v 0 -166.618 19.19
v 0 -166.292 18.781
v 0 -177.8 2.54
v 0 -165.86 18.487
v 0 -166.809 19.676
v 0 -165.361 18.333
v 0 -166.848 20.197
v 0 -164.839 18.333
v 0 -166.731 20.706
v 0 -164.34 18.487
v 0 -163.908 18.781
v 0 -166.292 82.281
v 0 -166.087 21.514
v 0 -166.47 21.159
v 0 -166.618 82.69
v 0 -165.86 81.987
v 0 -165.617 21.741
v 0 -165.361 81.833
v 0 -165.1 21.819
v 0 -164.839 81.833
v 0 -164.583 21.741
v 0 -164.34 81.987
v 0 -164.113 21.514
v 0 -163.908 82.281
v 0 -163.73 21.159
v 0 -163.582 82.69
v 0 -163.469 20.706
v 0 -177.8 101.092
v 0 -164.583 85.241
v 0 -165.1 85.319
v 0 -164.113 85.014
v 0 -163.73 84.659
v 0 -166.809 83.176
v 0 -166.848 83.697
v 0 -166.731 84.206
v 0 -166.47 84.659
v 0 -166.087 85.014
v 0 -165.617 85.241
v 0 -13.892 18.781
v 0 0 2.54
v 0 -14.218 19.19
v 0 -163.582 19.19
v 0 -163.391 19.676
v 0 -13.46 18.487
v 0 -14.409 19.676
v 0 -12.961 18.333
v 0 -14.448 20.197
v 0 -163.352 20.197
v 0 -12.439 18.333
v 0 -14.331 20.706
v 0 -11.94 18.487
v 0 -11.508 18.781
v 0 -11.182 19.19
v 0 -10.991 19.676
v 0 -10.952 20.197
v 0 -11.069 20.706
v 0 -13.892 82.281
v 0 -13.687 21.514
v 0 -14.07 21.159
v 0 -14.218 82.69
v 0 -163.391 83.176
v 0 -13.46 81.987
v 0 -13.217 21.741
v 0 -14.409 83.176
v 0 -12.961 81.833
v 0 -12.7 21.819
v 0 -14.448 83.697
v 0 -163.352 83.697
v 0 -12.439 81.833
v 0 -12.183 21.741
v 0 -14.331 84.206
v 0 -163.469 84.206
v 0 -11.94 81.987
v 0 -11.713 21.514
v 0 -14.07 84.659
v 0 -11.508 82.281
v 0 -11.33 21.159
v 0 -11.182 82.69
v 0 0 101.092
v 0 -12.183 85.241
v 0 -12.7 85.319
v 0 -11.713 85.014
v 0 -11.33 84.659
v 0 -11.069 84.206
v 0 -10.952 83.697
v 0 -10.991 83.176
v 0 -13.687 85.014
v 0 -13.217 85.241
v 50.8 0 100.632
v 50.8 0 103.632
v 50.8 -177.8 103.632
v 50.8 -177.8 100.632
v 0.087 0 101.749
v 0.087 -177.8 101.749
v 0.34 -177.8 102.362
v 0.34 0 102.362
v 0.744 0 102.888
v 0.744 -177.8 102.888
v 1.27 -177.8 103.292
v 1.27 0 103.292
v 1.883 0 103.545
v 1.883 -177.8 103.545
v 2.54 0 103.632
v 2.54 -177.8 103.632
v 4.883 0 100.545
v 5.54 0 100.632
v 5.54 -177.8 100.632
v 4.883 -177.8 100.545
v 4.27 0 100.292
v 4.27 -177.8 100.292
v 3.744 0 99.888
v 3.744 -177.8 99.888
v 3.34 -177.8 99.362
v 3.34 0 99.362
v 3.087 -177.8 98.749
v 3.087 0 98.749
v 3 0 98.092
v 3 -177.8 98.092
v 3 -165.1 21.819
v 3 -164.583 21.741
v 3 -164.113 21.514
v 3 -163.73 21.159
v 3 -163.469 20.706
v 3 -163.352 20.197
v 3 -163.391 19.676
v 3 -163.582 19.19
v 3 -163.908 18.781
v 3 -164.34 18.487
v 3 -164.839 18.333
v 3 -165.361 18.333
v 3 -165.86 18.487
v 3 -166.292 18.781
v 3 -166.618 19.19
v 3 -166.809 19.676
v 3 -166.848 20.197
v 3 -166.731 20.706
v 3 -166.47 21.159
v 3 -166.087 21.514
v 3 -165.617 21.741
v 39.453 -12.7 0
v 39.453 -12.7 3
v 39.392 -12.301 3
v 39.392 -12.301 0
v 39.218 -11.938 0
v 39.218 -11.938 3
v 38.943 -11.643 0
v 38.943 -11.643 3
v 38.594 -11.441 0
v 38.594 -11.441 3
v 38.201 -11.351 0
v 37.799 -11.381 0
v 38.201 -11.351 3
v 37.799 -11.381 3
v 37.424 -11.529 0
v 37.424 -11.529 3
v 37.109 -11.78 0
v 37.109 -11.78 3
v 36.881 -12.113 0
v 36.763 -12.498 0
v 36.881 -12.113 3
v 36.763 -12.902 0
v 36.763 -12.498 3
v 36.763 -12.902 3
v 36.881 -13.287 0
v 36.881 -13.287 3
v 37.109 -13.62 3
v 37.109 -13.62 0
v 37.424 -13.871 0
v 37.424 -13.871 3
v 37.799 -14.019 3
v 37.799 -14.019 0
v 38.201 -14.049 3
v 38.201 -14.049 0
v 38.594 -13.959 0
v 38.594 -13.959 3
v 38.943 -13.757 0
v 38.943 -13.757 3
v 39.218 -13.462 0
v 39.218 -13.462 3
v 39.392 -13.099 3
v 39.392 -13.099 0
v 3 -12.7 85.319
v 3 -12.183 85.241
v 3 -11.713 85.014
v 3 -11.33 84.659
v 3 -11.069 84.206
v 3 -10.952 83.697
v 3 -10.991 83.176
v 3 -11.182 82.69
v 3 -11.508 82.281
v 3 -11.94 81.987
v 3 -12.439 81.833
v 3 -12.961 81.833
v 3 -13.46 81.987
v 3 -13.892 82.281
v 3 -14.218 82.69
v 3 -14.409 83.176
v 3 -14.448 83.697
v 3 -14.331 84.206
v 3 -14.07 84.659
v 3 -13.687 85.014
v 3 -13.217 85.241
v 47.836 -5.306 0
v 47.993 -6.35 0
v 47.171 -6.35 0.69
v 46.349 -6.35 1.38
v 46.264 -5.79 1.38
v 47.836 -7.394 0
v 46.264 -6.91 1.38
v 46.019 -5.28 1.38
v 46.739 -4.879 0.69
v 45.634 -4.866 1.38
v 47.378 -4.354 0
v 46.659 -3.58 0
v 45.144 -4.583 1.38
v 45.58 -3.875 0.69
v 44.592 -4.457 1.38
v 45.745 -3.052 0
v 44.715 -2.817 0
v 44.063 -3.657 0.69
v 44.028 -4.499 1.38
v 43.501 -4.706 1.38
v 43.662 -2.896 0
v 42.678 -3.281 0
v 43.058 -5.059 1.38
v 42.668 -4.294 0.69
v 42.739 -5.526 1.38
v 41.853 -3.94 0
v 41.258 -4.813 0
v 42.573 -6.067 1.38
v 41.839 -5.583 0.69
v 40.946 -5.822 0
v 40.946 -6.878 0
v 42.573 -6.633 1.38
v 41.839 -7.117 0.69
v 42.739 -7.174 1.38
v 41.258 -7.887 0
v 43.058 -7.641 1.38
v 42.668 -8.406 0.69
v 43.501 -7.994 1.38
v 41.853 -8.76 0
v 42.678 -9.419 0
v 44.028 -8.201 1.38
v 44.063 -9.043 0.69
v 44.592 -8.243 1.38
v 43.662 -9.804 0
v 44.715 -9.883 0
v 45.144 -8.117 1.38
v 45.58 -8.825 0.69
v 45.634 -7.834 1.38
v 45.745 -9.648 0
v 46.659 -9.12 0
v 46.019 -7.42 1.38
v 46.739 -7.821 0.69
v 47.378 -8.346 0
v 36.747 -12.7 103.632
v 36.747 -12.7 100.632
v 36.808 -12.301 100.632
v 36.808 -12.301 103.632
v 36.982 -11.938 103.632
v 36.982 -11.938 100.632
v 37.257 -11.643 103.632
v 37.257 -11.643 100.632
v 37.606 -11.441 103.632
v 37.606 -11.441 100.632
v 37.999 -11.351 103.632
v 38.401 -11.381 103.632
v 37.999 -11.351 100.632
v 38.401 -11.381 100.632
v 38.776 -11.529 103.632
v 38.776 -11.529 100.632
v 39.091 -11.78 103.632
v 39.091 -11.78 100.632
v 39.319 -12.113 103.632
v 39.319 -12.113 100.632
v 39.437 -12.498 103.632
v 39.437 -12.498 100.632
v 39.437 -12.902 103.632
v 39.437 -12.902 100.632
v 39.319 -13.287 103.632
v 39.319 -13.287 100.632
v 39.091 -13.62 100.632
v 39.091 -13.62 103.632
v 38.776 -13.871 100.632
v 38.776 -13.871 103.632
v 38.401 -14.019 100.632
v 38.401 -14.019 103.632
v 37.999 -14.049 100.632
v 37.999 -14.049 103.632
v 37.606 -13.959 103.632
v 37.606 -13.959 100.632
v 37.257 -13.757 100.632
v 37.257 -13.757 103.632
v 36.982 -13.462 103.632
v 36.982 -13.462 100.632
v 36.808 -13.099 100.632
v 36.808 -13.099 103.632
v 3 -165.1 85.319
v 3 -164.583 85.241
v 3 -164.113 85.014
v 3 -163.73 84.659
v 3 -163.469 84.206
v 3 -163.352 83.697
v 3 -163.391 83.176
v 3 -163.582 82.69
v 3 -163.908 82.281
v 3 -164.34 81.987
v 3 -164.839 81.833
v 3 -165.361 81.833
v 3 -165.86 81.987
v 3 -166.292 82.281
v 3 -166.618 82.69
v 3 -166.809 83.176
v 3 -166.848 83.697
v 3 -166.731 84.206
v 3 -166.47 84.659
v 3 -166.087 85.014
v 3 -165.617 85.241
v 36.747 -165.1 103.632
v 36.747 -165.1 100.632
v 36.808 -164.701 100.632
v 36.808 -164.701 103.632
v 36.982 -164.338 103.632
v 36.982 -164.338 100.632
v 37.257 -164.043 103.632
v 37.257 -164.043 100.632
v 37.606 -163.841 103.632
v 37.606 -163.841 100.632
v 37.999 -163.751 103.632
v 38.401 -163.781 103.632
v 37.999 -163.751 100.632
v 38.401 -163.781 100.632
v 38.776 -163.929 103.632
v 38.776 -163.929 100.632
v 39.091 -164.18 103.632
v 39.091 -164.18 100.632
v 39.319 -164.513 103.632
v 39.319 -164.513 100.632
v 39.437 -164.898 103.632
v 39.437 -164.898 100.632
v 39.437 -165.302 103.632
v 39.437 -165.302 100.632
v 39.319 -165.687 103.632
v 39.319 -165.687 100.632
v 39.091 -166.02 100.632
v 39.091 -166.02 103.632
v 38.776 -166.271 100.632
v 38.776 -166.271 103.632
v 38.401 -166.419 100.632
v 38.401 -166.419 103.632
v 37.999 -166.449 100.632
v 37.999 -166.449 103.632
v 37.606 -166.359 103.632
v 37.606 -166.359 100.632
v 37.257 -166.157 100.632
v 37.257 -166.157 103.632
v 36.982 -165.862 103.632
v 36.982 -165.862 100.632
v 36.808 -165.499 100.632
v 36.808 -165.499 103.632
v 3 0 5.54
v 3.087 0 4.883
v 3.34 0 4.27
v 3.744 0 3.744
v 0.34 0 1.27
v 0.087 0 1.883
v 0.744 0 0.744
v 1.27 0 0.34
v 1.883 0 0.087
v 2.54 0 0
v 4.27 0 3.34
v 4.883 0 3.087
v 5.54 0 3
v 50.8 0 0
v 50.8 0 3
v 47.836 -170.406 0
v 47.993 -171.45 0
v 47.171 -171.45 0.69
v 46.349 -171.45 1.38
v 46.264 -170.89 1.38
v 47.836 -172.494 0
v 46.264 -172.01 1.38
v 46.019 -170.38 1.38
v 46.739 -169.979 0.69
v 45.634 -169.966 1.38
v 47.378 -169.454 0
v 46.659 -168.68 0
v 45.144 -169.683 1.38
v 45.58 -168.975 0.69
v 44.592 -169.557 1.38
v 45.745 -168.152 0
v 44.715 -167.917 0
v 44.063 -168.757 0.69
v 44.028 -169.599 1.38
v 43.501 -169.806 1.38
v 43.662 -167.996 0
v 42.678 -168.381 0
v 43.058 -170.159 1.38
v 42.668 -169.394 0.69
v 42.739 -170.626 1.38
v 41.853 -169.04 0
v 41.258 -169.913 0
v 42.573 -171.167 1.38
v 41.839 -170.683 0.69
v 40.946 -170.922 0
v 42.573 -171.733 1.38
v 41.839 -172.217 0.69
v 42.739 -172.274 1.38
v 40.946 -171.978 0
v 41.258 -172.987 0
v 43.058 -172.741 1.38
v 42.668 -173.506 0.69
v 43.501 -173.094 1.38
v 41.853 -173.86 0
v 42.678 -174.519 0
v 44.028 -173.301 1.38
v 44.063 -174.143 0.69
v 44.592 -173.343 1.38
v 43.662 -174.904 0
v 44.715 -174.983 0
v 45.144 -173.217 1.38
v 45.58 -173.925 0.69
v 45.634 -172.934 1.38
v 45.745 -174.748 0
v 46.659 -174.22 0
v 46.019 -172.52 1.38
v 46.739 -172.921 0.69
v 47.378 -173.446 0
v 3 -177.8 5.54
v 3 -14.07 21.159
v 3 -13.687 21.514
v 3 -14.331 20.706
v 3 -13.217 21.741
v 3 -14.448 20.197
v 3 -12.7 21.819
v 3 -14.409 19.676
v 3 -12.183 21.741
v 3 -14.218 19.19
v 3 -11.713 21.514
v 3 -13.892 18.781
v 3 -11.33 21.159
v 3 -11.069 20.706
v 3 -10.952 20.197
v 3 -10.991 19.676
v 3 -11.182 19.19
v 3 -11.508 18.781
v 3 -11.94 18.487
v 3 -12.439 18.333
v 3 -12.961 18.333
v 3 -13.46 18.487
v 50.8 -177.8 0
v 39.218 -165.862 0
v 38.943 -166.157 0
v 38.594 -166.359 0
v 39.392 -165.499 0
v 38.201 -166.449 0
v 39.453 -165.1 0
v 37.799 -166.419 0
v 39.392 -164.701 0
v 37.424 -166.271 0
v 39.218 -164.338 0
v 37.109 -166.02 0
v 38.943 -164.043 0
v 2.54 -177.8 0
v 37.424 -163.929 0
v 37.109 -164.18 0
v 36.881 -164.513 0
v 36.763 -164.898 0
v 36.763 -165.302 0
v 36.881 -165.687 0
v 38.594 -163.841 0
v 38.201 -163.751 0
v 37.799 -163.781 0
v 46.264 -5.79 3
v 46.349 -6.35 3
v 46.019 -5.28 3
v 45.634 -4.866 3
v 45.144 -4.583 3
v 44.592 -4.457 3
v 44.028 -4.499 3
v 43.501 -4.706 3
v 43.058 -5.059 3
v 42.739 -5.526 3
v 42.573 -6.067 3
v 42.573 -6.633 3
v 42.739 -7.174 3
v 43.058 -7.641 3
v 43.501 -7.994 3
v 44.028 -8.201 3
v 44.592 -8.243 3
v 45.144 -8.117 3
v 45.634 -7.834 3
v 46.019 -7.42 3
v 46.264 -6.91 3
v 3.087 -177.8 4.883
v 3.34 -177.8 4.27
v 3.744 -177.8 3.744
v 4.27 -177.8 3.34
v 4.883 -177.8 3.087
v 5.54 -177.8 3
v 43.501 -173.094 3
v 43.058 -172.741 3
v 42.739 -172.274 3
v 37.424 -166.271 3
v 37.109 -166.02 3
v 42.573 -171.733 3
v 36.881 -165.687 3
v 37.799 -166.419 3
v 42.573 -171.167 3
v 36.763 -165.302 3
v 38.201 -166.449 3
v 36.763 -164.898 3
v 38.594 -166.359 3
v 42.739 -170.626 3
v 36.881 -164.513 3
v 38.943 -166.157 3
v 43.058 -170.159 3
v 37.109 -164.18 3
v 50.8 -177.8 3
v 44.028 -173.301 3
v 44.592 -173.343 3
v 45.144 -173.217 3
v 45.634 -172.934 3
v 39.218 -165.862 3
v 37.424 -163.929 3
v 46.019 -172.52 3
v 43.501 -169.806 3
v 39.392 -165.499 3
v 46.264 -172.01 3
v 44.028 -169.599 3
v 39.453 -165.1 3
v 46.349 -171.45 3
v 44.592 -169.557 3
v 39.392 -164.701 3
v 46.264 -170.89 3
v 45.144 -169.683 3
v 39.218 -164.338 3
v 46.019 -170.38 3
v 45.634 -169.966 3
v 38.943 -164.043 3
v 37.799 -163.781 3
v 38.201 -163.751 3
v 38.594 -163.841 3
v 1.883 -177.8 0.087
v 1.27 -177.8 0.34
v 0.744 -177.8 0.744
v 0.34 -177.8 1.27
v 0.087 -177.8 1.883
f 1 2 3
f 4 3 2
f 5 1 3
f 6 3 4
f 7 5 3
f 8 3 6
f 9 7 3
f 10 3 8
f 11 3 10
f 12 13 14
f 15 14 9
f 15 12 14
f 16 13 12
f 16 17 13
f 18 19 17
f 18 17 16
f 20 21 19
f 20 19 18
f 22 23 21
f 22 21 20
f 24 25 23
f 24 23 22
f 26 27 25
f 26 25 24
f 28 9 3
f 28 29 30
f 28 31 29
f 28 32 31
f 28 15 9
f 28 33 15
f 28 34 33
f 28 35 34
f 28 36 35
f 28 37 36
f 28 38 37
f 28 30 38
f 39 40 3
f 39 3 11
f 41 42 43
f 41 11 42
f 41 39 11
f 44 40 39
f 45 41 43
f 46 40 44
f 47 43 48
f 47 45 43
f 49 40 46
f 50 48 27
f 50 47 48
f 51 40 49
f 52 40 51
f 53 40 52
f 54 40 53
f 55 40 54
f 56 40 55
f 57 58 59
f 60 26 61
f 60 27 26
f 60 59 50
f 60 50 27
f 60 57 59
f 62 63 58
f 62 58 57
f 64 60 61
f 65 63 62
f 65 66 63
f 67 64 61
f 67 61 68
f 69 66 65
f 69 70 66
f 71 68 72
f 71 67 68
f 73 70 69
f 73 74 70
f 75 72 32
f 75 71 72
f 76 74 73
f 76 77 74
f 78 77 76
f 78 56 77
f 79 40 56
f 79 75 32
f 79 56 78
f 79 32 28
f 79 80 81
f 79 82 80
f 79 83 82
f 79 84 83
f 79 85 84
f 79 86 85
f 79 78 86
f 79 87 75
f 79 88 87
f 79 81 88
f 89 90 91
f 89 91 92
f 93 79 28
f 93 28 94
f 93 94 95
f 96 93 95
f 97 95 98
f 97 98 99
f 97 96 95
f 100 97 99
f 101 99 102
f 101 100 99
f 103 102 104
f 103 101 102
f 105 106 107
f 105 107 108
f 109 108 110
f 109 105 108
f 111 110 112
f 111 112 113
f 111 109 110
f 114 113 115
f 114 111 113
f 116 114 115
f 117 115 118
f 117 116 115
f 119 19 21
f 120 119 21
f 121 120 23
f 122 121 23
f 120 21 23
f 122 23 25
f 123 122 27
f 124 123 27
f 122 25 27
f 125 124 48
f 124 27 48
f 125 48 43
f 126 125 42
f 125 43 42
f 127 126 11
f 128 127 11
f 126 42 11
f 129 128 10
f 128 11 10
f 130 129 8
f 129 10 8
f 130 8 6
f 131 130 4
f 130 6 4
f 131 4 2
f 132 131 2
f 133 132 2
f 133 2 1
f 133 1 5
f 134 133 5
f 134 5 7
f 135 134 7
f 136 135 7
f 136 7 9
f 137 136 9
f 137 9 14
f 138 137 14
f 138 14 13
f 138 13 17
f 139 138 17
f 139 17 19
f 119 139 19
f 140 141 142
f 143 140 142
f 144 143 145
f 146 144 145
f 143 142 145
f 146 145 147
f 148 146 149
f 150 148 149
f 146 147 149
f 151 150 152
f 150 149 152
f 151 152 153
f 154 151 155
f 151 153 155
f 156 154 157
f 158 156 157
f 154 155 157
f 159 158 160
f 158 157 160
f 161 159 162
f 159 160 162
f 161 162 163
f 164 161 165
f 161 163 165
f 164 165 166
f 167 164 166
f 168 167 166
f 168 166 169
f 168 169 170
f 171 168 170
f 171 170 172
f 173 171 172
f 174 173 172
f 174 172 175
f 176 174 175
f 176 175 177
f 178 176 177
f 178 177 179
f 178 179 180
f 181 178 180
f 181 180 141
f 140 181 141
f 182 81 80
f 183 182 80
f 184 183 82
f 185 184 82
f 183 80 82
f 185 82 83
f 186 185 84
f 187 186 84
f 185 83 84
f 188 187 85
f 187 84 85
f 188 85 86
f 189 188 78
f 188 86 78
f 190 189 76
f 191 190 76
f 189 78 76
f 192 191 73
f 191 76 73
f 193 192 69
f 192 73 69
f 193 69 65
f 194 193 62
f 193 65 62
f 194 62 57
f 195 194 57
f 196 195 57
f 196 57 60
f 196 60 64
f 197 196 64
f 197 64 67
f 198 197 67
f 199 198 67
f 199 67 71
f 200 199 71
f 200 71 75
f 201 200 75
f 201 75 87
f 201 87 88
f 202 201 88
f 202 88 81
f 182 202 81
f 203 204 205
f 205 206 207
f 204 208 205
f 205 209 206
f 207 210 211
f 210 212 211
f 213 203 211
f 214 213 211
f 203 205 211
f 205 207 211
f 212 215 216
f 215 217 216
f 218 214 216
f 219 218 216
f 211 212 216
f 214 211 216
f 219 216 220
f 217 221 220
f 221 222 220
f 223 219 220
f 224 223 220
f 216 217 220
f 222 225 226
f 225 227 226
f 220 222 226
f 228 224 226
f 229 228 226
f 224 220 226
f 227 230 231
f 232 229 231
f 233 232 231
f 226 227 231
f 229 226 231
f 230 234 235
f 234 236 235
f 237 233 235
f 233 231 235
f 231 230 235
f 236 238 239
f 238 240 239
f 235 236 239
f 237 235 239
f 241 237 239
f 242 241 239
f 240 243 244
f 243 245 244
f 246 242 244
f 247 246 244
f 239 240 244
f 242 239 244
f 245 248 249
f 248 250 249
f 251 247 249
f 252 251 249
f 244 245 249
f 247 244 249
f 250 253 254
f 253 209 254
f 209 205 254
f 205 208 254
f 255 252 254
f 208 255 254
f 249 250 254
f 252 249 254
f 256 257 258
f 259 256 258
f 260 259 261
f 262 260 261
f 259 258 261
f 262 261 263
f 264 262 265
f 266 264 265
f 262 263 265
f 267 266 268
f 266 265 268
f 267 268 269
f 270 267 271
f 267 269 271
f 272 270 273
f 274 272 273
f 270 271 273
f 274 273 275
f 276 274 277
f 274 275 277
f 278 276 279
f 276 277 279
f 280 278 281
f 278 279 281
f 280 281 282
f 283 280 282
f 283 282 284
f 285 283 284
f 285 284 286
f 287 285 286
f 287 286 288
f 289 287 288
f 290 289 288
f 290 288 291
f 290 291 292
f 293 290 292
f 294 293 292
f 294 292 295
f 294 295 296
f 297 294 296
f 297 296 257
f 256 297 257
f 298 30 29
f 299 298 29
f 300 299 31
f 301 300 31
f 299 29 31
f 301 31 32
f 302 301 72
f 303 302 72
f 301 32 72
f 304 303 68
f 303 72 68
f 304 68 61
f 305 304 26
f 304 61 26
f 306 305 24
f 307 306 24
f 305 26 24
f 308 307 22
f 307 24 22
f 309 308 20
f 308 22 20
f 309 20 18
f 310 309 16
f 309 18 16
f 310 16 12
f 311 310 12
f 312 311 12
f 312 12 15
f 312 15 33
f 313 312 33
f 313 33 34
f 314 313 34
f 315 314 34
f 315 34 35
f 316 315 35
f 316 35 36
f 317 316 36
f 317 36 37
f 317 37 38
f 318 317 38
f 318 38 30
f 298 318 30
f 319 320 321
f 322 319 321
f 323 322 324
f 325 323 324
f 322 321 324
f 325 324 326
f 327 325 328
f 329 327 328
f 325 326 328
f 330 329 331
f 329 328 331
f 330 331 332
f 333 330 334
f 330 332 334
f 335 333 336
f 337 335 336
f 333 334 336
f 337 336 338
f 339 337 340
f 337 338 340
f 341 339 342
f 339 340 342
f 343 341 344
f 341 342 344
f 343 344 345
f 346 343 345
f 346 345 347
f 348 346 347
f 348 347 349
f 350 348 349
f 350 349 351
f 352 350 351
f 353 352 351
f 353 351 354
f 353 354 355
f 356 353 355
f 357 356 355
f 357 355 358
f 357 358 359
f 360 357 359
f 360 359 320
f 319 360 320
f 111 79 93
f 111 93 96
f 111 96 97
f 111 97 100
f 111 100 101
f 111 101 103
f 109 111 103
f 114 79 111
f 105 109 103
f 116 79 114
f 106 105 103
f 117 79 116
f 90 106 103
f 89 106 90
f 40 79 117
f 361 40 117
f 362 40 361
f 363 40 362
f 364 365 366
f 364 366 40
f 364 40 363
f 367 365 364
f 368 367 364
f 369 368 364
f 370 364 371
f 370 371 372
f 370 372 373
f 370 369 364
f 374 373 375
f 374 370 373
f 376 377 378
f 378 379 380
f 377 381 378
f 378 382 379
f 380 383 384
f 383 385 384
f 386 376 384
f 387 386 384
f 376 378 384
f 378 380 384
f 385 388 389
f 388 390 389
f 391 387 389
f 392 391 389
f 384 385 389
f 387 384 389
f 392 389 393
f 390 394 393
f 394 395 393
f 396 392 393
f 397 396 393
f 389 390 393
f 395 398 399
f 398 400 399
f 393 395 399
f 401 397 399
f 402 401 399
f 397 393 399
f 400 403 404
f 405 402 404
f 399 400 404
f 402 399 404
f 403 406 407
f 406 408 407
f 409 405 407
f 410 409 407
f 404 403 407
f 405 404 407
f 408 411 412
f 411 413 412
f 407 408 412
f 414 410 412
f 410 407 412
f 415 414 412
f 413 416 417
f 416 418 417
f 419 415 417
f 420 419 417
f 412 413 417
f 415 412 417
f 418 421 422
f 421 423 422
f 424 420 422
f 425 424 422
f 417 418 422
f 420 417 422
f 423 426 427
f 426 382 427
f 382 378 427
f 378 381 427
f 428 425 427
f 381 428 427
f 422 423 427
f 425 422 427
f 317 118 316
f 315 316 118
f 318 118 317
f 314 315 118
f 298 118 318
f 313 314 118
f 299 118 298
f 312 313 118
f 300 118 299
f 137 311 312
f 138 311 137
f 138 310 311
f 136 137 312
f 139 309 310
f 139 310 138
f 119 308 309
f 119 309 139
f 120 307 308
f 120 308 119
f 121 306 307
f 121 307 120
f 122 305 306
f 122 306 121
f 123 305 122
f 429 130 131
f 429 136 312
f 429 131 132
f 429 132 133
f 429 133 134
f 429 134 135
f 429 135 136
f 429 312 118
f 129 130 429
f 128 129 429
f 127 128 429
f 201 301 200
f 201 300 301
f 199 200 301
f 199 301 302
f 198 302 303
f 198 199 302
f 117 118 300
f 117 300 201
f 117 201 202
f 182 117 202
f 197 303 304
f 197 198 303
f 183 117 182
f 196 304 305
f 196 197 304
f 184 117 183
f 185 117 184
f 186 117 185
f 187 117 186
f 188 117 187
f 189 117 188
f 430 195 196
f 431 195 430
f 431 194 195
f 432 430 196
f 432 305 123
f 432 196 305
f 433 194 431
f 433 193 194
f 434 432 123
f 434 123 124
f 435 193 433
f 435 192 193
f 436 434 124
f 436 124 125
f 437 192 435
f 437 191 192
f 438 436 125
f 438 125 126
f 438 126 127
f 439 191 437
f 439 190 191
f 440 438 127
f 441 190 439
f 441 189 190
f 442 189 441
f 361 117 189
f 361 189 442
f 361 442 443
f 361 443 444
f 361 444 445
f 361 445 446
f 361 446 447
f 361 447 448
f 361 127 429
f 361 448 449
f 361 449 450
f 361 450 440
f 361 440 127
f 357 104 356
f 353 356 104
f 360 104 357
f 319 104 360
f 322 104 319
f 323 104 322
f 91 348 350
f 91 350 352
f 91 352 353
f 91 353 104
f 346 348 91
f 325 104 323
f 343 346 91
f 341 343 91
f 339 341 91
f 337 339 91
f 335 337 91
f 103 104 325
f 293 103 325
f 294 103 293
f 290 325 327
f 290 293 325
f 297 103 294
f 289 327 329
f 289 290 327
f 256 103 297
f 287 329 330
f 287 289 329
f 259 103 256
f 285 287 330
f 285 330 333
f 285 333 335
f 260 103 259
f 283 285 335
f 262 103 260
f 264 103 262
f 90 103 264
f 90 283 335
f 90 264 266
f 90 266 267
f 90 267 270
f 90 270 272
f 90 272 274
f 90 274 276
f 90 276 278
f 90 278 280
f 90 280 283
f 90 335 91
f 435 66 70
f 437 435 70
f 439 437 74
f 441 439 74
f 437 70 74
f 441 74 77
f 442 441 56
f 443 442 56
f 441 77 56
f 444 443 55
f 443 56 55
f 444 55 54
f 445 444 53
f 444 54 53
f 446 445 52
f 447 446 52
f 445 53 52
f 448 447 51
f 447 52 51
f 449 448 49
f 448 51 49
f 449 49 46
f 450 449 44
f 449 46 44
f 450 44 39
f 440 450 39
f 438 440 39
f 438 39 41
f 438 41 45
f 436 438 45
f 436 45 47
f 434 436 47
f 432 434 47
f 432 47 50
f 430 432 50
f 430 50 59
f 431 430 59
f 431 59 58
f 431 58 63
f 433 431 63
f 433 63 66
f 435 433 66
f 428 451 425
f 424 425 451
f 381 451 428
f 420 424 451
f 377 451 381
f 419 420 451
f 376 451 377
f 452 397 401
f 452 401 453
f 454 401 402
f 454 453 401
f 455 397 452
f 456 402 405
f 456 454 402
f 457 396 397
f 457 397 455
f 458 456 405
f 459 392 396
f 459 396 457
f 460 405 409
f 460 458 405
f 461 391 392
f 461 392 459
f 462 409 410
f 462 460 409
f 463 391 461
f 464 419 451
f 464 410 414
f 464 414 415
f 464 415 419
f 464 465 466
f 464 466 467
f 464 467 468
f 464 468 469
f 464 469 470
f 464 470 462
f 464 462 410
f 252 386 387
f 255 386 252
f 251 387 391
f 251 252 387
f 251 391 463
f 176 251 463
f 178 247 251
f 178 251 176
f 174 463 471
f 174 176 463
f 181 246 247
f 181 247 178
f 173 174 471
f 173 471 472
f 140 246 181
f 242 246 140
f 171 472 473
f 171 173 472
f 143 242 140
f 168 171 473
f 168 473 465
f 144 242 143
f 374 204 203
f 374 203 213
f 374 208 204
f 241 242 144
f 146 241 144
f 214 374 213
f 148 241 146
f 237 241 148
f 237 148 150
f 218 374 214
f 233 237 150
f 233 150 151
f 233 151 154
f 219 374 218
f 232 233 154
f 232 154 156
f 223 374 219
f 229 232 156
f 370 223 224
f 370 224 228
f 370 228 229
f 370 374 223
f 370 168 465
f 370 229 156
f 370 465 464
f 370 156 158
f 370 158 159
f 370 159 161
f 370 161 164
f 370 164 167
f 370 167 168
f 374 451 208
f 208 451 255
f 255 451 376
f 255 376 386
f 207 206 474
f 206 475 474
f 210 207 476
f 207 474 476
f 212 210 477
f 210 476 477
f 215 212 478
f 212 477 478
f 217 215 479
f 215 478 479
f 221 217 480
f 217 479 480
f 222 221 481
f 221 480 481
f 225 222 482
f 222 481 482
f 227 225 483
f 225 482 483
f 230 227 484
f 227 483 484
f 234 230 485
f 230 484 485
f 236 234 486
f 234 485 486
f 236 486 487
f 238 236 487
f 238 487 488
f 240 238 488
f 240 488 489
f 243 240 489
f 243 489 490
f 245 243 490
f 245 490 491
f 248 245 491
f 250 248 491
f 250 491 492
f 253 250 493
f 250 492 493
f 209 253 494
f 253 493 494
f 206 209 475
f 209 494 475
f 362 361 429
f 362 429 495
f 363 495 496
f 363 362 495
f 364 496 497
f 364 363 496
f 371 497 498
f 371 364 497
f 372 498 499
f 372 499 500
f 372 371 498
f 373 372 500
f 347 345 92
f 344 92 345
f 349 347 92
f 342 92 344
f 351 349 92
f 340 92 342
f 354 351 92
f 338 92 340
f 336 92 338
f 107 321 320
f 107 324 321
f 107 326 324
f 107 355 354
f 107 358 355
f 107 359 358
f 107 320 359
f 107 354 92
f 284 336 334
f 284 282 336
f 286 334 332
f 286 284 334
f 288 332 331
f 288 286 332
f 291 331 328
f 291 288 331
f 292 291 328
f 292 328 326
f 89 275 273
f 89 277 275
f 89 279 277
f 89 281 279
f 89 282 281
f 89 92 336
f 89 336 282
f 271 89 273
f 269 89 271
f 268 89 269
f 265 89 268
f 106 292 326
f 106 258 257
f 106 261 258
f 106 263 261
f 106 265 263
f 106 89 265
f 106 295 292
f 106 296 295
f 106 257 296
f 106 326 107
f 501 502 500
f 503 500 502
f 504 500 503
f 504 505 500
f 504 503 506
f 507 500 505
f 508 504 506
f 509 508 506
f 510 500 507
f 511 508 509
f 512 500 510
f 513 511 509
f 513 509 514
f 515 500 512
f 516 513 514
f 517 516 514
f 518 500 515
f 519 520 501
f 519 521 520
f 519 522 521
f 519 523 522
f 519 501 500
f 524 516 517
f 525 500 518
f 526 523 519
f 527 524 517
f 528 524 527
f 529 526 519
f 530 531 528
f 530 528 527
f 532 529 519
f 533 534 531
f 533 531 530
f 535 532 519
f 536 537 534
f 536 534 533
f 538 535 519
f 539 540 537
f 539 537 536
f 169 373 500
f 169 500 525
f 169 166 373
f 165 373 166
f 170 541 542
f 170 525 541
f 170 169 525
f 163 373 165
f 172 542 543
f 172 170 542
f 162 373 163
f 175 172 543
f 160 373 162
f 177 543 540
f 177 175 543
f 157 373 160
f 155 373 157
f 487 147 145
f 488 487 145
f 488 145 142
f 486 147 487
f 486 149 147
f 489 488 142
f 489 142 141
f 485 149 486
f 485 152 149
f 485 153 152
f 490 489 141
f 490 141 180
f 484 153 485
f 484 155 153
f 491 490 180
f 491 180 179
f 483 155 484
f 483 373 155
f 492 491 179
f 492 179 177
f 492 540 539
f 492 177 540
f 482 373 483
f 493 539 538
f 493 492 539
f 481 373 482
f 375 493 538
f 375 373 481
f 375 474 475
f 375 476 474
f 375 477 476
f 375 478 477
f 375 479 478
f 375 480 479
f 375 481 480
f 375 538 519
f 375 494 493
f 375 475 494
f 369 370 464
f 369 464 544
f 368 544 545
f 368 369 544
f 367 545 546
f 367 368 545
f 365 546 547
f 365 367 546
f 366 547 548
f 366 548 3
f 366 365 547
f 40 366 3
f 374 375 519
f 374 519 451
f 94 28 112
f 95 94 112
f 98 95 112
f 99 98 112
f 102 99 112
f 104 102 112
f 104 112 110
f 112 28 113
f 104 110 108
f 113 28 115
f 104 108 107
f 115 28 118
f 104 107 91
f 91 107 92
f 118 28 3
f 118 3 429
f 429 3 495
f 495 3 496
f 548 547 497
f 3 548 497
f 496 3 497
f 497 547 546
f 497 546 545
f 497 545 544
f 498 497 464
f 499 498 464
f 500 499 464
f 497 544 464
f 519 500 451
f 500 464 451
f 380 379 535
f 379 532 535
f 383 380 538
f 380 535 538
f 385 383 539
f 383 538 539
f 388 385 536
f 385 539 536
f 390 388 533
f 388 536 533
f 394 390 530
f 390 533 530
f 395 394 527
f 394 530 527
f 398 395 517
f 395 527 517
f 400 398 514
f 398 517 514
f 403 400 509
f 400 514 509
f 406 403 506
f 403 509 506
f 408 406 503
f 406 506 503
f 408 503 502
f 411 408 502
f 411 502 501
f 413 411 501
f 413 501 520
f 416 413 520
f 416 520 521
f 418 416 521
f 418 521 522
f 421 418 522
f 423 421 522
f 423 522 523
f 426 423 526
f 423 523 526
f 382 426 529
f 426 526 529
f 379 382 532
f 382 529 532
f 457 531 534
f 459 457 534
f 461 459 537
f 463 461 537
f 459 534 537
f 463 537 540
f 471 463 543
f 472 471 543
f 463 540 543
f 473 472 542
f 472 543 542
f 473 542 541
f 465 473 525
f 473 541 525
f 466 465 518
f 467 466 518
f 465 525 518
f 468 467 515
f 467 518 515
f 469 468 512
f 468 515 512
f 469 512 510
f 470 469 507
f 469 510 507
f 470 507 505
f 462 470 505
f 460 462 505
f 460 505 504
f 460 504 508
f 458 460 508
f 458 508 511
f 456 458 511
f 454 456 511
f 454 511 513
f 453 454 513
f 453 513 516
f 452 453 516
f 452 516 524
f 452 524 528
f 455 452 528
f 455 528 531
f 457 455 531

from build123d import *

# Parameters (mm, degrees)
EXTRUDE1_DEPTH                                    = 177.8
F_6_32_TAPPED_HOLE1_D                             = 2.7051
F_6_32_TAPPED_HOLE1_DEPTH                         = 9.38784
F_6_32_TAPPED_HOLE1_CBORE_D                       = 3.5052
F_6_32_TAPPED_HOLE1_CBORE_DEPTH                   = 7.0104
F_6_32_TAPPED_HOLE1_TIP                           = 0.81269403
F_6_32_TAPPED_HOLE2_D                             = 2.7051
F_6_32_TAPPED_HOLE2_DEPTH                         = 9.38784
F_6_32_TAPPED_HOLE2_TIP                           = 0.81269403
F_6_32_TAPPED_HOLE3_D                             = 2.7051
F_6_32_TAPPED_HOLE3_DEPTH                         = 9.38784
F_6_32_TAPPED_HOLE3_TIP                           = 0.81269403
CSK_FOR_6_FLAT_HEAD_MACHINE_SCREW_100_D           = 3.7973
CSK_FOR_6_FLAT_HEAD_MACHINE_SCREW_100_DEPTH       = 12.7
CSK_FOR_6_FLAT_HEAD_MACHINE_SCREW_100_CSINK_D     = 7.0866
CSK_FOR_6_FLAT_HEAD_MACHINE_SCREW_100_CSINK_ANGLE = 100
CSK_FOR_6_FLAT_HEAD_MACHINE_SCREW_100_TIP         = 1.140824014


with BuildPart() as part:
    # Sketch1 → Extrude1 (new body)
    with BuildSketch(Plane(origin=(0, 0, 0), x_dir=(1, 0, 0), z_dir=(0, 1, 0))):
        with BuildLine():
            Line((0, -2.54), (0, -101.092))
            ThreePointArc((0, -101.092), (0.743948776, -102.888051224), (2.54, -103.632))
            Line((2.54, -103.632), (50.8, -103.632))
            Line((50.8, -103.632), (50.8, -100.632))
            Line((50.8, -100.632), (5.54, -100.632))
            ThreePointArc((5.54, -100.632), (3.743948776, -99.888051224), (3, -98.092))
            Line((3, -98.092), (3, -5.54))
            ThreePointArc((3, -5.54), (3.743948776, -3.743948776), (5.54, -3))
            Line((5.54, -3), (50.8, -3))
            Line((50.8, -3), (50.8, 0))
            Line((50.8, 0), (2.54, 0))
            ThreePointArc((2.54, 0), (0.743948776, -0.743948776), (0, -2.54))
        make_face()
    extrude(amount=-EXTRUDE1_DEPTH)

    # #6-32 Tapped Hole1
    with Locations(Plane.ZY):
        with Locations((20.066, -12.7), (83.566, -12.7), (83.566, -165.1), (20.066, -165.1)):
            CounterBoreHole(F_6_32_TAPPED_HOLE1_D / 2, F_6_32_TAPPED_HOLE1_CBORE_D / 2, F_6_32_TAPPED_HOLE1_CBORE_DEPTH, depth=F_6_32_TAPPED_HOLE1_DEPTH)
            with Locations((0, 0, -(F_6_32_TAPPED_HOLE1_DEPTH + F_6_32_TAPPED_HOLE1_TIP / 2))):  # 118° drill point
                Cone(0, F_6_32_TAPPED_HOLE1_D / 2, F_6_32_TAPPED_HOLE1_TIP, mode=Mode.SUBTRACT)

    # #6-32 Tapped Hole2
    with Locations(Plane(origin=(0, 0, 0), x_dir=(-1, 0, 0), z_dir=(0, 0, -1))):
        with Locations((-38.1, -12.7), (-38.1, -165.1)):
            Hole(F_6_32_TAPPED_HOLE2_D / 2, depth=F_6_32_TAPPED_HOLE2_DEPTH)
            with Locations((0, 0, -(F_6_32_TAPPED_HOLE2_DEPTH + F_6_32_TAPPED_HOLE2_TIP / 2))):  # 118° drill point
                Cone(0, F_6_32_TAPPED_HOLE2_D / 2, F_6_32_TAPPED_HOLE2_TIP, mode=Mode.SUBTRACT)

    # #6-32 Tapped Hole3
    with Locations(Plane.XY.offset(103.632)):
        with Locations((38.1, -12.7), (38.1, -165.1)):
            Hole(F_6_32_TAPPED_HOLE3_D / 2, depth=F_6_32_TAPPED_HOLE3_DEPTH)
            with Locations((0, 0, -(F_6_32_TAPPED_HOLE3_DEPTH + F_6_32_TAPPED_HOLE3_TIP / 2))):  # 118° drill point
                Cone(0, F_6_32_TAPPED_HOLE3_D / 2, F_6_32_TAPPED_HOLE3_TIP, mode=Mode.SUBTRACT)

    # CSK for #6 Flat Head Machine Screw (100)1
    with Locations(Plane(origin=(0, 0, 0), x_dir=(-1, 0, 0), z_dir=(0, 0, -1))):
        with Locations((-44.45, -171.45), (-44.45, -6.35)):
            CounterSinkHole(CSK_FOR_6_FLAT_HEAD_MACHINE_SCREW_100_D / 2, CSK_FOR_6_FLAT_HEAD_MACHINE_SCREW_100_CSINK_D / 2, depth=CSK_FOR_6_FLAT_HEAD_MACHINE_SCREW_100_DEPTH, counter_sink_angle=CSK_FOR_6_FLAT_HEAD_MACHINE_SCREW_100_CSINK_ANGLE)
            with Locations((0, 0, -(CSK_FOR_6_FLAT_HEAD_MACHINE_SCREW_100_DEPTH + CSK_FOR_6_FLAT_HEAD_MACHINE_SCREW_100_TIP / 2))):  # 118° drill point
                Cone(0, CSK_FOR_6_FLAT_HEAD_MACHINE_SCREW_100_D / 2, CSK_FOR_6_FLAT_HEAD_MACHINE_SCREW_100_TIP, mode=Mode.SUBTRACT)


solid = part.part
